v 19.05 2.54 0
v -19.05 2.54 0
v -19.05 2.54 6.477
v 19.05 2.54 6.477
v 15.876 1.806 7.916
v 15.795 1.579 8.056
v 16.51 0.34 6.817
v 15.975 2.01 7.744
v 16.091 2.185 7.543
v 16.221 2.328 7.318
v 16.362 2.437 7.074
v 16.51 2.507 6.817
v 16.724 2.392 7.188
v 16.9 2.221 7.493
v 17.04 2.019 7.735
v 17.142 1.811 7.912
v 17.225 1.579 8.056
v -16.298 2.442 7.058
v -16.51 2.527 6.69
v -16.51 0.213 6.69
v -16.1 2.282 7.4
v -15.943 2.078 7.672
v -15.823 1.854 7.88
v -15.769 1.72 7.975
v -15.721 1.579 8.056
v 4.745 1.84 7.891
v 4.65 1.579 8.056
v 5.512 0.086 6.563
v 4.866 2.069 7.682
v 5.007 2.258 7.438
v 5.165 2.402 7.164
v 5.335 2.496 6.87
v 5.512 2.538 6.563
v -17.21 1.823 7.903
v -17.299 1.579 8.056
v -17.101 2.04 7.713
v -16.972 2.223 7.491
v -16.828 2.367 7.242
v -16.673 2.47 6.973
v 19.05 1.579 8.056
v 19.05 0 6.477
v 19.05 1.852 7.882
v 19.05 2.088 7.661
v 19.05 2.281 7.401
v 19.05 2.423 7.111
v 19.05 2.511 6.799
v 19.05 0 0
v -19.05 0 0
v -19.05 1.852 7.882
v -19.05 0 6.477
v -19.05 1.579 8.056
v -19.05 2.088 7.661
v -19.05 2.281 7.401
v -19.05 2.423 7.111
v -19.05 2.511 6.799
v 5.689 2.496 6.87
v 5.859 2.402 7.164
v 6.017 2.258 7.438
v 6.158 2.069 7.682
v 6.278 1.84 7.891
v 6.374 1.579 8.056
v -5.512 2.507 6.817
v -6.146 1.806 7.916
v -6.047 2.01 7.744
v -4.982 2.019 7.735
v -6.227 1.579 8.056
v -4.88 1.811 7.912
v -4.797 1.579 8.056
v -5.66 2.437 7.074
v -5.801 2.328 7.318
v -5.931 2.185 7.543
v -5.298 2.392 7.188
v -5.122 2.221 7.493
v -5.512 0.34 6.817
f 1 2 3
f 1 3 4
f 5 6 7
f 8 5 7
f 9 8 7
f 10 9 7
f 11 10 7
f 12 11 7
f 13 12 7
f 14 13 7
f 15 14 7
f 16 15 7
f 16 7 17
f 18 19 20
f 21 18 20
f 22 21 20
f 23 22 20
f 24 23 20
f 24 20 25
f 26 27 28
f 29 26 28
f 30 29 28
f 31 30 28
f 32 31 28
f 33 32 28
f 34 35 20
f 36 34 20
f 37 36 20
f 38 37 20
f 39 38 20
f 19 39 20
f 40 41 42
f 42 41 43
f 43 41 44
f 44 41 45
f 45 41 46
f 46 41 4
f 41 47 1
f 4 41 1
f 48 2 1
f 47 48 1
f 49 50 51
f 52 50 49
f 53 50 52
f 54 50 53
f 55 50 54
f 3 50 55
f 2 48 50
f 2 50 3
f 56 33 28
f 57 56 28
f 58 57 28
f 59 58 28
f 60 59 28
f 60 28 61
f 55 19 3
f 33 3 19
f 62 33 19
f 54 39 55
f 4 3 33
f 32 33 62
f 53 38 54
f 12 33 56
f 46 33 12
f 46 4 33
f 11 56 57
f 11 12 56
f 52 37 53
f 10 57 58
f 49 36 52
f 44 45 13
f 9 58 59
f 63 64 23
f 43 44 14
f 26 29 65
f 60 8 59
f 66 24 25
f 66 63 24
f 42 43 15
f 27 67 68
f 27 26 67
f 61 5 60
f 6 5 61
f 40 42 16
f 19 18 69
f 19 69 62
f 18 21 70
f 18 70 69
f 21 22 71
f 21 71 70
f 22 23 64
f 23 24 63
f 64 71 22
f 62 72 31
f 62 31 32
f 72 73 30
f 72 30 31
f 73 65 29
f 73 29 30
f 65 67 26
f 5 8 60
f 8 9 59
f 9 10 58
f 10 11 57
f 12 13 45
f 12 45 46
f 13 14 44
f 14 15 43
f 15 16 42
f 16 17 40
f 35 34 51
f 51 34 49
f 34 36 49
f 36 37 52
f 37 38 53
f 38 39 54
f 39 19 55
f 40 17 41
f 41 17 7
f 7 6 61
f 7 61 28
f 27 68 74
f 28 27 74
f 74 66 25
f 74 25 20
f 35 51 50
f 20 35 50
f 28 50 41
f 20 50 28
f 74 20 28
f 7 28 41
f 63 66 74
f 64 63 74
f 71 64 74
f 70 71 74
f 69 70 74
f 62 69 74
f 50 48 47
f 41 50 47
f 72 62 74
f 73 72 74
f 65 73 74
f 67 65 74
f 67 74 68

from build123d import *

# Parameters (mm, degrees)
F0_W        = 38.1
F0_H        = 2.54
F1_DEPTH    = 8.255
F3_R        = 1.778
F4_T1_DEPTH = 47.2449047052
F5_DEPTH    = 25.4


# Not quite as in the source:
# - a fillet or chamfer that OpenCascade refuses, or shapes differently, is made with other operations: its cross-section is extruded or revolved along the edge and cut away or added


with BuildPart() as f1:
    # F0 (on Top) → F1 (new body)
    with BuildSketch(Plane.XY):
        with Locations((0, 1.27)):
            Rectangle(F0_W, F0_H)
    extrude(amount=F1_DEPTH)

    # F3
    f3_edges = [f1.edges().sort_by_distance(p)[0] for p in [
        (0, 2.54, 8.255),
    ]]
    fillet(f3_edges, radius=F3_R)

    # F4: chamfer of 1.778 on 1 edges, made by hand

    # F4_s2 → F4_t1 (cut)
    with BuildSketch(Plane.YZ.offset(-23.6224523526)):
        Polygon((1.778, 8.255), (0, 6.477), (0, 8.255), align=None)
    extrude(amount=F4_T1_DEPTH, mode=Mode.SUBTRACT)

    # F2 (on face) → F5 (cut)
    with BuildSketch(Plane.XZ):
        Polygon((-16.51, 6.6902954744), (-15.6066174209, 8.255), (-17.4133825791, 8.255), align=None)
        Polygon((-4.6817409051, 8.255), (-6.3418590949, 8.255), (-5.5118, 6.8172954744), align=None)
        Polygon((6.4885060633, 8.255), (4.5350939367, 8.255), (5.5118, 6.5632954744), align=None)
        Polygon((17.3400590949, 8.255), (15.6799409051, 8.255), (16.51, 6.8172954744), align=None)
    extrude(amount=-F5_DEPTH, mode=Mode.SUBTRACT)


solid = f1.part
